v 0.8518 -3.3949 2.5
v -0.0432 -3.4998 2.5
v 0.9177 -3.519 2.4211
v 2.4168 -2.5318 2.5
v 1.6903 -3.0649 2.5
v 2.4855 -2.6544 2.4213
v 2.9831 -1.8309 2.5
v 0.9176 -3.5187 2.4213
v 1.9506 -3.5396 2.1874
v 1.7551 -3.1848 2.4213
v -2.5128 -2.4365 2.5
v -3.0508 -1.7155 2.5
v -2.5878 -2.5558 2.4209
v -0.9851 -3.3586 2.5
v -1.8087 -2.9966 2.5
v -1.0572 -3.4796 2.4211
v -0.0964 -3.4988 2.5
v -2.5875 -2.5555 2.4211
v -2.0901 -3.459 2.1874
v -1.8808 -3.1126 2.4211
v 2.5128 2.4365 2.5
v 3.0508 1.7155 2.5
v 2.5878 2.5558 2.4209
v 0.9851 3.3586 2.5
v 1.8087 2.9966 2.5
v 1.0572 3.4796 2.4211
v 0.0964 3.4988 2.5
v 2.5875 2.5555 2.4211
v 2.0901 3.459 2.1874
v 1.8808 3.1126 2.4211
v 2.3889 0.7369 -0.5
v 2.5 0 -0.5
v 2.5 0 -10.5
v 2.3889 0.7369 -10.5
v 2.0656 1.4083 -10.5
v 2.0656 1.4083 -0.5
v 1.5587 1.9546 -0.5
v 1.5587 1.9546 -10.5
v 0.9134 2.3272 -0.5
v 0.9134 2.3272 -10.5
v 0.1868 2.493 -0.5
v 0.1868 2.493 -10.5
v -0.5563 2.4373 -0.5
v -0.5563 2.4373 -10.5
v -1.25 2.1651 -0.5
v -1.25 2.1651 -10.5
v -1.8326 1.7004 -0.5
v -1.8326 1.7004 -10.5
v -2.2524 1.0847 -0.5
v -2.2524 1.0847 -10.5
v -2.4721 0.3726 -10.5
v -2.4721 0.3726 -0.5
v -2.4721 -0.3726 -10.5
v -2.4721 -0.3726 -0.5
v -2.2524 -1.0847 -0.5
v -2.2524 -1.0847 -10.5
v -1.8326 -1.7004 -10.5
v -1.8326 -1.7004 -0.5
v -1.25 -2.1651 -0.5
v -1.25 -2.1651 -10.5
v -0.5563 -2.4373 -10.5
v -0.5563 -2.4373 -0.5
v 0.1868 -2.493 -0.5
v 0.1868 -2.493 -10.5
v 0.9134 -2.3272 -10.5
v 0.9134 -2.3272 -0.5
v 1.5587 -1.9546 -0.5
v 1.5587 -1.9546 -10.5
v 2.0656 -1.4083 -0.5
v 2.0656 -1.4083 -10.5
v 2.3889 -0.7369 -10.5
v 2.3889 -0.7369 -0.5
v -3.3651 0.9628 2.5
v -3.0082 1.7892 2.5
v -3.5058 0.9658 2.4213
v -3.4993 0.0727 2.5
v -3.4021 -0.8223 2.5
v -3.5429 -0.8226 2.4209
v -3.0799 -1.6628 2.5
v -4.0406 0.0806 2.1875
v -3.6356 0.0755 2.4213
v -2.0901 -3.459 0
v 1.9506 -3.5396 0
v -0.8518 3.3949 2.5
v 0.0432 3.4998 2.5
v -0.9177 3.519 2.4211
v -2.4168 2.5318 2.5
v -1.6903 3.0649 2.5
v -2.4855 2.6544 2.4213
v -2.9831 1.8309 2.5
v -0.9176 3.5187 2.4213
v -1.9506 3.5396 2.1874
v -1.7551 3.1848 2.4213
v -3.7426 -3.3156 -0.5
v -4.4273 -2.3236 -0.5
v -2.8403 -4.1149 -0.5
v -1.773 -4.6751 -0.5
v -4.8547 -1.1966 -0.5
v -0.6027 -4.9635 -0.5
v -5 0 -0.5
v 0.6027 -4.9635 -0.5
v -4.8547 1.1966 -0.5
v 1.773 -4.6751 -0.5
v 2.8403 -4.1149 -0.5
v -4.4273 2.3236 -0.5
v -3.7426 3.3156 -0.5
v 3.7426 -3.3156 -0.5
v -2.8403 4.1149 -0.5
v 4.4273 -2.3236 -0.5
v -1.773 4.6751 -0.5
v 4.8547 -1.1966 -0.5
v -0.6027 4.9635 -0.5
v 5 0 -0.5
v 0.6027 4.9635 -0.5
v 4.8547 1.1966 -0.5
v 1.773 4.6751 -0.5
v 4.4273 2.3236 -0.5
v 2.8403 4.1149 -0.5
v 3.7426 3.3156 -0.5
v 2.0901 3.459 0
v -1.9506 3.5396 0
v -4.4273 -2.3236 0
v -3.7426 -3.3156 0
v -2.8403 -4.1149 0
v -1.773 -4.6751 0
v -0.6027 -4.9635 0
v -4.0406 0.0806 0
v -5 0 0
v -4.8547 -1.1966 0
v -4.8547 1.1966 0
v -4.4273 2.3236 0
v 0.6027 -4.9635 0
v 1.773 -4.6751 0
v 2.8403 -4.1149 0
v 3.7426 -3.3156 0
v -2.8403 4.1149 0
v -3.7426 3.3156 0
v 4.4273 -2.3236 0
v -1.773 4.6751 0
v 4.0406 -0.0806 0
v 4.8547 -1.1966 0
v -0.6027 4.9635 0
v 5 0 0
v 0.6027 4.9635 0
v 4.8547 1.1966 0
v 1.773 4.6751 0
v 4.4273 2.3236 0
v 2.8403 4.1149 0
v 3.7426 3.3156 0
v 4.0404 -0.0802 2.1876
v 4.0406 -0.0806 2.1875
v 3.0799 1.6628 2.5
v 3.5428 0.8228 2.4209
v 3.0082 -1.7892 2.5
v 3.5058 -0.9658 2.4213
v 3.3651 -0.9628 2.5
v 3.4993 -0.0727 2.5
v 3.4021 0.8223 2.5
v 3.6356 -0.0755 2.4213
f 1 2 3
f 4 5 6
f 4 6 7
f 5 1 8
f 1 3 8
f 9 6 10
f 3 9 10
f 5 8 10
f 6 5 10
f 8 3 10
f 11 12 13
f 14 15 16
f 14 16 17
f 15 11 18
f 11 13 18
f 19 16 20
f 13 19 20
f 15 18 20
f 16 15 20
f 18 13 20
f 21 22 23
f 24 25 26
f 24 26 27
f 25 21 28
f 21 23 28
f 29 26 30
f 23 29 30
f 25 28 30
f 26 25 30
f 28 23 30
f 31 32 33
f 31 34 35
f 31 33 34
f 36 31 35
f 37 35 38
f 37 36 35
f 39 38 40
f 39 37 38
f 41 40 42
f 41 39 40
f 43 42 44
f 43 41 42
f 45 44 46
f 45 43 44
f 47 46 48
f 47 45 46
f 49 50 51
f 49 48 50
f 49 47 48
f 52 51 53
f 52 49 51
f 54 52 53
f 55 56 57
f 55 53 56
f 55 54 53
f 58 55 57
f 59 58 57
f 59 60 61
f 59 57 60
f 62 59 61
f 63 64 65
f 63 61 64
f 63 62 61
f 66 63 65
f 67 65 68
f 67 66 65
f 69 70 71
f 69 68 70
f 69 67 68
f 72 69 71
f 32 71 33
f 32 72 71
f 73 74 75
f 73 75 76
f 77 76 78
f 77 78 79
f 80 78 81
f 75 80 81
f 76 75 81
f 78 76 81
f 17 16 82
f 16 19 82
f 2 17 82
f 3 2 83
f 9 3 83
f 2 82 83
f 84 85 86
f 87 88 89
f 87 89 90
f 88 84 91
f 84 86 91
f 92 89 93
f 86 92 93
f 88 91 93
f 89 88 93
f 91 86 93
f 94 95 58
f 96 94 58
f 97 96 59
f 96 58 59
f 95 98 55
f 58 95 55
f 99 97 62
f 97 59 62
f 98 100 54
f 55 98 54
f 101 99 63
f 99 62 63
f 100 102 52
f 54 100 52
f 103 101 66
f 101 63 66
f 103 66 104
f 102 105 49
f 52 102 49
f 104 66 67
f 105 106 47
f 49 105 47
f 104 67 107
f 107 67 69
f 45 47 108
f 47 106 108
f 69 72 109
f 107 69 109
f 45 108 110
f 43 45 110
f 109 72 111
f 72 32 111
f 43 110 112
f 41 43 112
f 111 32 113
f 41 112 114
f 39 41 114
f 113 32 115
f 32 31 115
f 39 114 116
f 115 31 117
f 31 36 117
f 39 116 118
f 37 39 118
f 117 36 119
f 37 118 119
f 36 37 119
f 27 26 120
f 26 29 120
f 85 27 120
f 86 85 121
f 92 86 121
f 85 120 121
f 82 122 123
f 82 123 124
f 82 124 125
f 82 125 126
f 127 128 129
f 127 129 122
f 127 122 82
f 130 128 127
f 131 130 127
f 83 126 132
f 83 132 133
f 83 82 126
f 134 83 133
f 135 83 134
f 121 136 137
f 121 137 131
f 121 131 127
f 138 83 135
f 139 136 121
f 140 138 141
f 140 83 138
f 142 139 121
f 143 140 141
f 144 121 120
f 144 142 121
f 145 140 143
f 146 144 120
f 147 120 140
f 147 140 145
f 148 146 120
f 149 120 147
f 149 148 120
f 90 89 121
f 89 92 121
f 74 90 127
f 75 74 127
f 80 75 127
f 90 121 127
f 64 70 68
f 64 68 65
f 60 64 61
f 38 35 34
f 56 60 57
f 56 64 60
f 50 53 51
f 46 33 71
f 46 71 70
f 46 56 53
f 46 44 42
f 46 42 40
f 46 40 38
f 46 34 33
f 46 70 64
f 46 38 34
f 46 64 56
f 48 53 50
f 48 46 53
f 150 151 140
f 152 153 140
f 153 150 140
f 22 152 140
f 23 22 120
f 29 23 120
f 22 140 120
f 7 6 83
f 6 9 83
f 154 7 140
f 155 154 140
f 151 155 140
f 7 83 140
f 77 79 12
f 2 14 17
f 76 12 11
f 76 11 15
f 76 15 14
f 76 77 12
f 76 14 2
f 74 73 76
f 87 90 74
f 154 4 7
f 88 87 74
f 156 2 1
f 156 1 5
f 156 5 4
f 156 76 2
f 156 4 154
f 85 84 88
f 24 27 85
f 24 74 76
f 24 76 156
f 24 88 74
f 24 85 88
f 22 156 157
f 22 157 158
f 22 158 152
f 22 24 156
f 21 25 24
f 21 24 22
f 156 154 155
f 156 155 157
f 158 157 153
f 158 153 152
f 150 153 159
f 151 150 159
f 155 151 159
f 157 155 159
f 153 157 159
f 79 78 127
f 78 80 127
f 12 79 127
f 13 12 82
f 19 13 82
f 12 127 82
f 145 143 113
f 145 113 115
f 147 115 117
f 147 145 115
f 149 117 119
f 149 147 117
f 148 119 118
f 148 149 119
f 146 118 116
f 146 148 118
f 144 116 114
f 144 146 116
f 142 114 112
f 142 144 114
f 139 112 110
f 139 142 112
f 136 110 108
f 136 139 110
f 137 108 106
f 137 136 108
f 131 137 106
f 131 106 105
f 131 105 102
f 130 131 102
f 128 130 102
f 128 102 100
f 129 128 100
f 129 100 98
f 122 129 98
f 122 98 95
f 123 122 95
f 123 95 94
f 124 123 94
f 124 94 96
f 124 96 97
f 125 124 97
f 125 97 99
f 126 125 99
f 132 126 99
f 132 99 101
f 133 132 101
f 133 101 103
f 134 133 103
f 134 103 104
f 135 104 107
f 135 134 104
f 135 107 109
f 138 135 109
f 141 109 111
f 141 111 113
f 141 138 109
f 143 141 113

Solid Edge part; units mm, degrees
sketch "Sketch1" plane through (0, 0, 0) normal (0, 0, 1) x (1, 0, 0)
  circle A0 centre (0, 0) radius 5
extrude "Protrusion1" add sketch "Sketch1" against normal blind 0.5
sketch "Sketch2" plane through (0, 0, 0) normal (0, 0, 1) x (1, 0, 0)
  line L0 (-2.0901, -3.459) -> (1.9506, -3.5396)
  line L1 (1.9506, -3.5396) -> (4.0406, -0.0806)
  line L2 (4.0406, -0.0806) -> (2.0901, 3.459)
  line L3 (2.0901, 3.459) -> (-1.9506, 3.5396)
  line L4 (-1.9506, 3.5396) -> (-4.0406, 0.0806)
  line L5 (-4.0406, 0.0806) -> (-2.0901, -3.459)
extrude "ExtrudedProtrusion_2" add sketch "Sketch2" along normal blind 2.5
sketch "Sketch3" plane through (0, 0, -0.5) normal (0, 0, -1) x (1, 0, 0)
  circle A0 centre (0, 0) radius 2.5
extrude "ExtrudedProtrusion_3" add sketch "Sketch3" along normal blind 10
sketch "Sketch4" plane through (-4.0406, 0.0806, 2.5) normal (-0.0199, -0.9998, 0) x (0, 0, -1)
  line L0 (0, 7.5415) -> (0.3126, 8.0829)
  line L1 (0.3126, 8.0829) -> (0, 8.0829)
  line L2 (0, 8.0829) -> (0, 7.5415)
revolve "RevolvedCutout1" cut sketch "Sketch4" angle 360 about axis through (0, 0, 0) along (0, 0, 1)
